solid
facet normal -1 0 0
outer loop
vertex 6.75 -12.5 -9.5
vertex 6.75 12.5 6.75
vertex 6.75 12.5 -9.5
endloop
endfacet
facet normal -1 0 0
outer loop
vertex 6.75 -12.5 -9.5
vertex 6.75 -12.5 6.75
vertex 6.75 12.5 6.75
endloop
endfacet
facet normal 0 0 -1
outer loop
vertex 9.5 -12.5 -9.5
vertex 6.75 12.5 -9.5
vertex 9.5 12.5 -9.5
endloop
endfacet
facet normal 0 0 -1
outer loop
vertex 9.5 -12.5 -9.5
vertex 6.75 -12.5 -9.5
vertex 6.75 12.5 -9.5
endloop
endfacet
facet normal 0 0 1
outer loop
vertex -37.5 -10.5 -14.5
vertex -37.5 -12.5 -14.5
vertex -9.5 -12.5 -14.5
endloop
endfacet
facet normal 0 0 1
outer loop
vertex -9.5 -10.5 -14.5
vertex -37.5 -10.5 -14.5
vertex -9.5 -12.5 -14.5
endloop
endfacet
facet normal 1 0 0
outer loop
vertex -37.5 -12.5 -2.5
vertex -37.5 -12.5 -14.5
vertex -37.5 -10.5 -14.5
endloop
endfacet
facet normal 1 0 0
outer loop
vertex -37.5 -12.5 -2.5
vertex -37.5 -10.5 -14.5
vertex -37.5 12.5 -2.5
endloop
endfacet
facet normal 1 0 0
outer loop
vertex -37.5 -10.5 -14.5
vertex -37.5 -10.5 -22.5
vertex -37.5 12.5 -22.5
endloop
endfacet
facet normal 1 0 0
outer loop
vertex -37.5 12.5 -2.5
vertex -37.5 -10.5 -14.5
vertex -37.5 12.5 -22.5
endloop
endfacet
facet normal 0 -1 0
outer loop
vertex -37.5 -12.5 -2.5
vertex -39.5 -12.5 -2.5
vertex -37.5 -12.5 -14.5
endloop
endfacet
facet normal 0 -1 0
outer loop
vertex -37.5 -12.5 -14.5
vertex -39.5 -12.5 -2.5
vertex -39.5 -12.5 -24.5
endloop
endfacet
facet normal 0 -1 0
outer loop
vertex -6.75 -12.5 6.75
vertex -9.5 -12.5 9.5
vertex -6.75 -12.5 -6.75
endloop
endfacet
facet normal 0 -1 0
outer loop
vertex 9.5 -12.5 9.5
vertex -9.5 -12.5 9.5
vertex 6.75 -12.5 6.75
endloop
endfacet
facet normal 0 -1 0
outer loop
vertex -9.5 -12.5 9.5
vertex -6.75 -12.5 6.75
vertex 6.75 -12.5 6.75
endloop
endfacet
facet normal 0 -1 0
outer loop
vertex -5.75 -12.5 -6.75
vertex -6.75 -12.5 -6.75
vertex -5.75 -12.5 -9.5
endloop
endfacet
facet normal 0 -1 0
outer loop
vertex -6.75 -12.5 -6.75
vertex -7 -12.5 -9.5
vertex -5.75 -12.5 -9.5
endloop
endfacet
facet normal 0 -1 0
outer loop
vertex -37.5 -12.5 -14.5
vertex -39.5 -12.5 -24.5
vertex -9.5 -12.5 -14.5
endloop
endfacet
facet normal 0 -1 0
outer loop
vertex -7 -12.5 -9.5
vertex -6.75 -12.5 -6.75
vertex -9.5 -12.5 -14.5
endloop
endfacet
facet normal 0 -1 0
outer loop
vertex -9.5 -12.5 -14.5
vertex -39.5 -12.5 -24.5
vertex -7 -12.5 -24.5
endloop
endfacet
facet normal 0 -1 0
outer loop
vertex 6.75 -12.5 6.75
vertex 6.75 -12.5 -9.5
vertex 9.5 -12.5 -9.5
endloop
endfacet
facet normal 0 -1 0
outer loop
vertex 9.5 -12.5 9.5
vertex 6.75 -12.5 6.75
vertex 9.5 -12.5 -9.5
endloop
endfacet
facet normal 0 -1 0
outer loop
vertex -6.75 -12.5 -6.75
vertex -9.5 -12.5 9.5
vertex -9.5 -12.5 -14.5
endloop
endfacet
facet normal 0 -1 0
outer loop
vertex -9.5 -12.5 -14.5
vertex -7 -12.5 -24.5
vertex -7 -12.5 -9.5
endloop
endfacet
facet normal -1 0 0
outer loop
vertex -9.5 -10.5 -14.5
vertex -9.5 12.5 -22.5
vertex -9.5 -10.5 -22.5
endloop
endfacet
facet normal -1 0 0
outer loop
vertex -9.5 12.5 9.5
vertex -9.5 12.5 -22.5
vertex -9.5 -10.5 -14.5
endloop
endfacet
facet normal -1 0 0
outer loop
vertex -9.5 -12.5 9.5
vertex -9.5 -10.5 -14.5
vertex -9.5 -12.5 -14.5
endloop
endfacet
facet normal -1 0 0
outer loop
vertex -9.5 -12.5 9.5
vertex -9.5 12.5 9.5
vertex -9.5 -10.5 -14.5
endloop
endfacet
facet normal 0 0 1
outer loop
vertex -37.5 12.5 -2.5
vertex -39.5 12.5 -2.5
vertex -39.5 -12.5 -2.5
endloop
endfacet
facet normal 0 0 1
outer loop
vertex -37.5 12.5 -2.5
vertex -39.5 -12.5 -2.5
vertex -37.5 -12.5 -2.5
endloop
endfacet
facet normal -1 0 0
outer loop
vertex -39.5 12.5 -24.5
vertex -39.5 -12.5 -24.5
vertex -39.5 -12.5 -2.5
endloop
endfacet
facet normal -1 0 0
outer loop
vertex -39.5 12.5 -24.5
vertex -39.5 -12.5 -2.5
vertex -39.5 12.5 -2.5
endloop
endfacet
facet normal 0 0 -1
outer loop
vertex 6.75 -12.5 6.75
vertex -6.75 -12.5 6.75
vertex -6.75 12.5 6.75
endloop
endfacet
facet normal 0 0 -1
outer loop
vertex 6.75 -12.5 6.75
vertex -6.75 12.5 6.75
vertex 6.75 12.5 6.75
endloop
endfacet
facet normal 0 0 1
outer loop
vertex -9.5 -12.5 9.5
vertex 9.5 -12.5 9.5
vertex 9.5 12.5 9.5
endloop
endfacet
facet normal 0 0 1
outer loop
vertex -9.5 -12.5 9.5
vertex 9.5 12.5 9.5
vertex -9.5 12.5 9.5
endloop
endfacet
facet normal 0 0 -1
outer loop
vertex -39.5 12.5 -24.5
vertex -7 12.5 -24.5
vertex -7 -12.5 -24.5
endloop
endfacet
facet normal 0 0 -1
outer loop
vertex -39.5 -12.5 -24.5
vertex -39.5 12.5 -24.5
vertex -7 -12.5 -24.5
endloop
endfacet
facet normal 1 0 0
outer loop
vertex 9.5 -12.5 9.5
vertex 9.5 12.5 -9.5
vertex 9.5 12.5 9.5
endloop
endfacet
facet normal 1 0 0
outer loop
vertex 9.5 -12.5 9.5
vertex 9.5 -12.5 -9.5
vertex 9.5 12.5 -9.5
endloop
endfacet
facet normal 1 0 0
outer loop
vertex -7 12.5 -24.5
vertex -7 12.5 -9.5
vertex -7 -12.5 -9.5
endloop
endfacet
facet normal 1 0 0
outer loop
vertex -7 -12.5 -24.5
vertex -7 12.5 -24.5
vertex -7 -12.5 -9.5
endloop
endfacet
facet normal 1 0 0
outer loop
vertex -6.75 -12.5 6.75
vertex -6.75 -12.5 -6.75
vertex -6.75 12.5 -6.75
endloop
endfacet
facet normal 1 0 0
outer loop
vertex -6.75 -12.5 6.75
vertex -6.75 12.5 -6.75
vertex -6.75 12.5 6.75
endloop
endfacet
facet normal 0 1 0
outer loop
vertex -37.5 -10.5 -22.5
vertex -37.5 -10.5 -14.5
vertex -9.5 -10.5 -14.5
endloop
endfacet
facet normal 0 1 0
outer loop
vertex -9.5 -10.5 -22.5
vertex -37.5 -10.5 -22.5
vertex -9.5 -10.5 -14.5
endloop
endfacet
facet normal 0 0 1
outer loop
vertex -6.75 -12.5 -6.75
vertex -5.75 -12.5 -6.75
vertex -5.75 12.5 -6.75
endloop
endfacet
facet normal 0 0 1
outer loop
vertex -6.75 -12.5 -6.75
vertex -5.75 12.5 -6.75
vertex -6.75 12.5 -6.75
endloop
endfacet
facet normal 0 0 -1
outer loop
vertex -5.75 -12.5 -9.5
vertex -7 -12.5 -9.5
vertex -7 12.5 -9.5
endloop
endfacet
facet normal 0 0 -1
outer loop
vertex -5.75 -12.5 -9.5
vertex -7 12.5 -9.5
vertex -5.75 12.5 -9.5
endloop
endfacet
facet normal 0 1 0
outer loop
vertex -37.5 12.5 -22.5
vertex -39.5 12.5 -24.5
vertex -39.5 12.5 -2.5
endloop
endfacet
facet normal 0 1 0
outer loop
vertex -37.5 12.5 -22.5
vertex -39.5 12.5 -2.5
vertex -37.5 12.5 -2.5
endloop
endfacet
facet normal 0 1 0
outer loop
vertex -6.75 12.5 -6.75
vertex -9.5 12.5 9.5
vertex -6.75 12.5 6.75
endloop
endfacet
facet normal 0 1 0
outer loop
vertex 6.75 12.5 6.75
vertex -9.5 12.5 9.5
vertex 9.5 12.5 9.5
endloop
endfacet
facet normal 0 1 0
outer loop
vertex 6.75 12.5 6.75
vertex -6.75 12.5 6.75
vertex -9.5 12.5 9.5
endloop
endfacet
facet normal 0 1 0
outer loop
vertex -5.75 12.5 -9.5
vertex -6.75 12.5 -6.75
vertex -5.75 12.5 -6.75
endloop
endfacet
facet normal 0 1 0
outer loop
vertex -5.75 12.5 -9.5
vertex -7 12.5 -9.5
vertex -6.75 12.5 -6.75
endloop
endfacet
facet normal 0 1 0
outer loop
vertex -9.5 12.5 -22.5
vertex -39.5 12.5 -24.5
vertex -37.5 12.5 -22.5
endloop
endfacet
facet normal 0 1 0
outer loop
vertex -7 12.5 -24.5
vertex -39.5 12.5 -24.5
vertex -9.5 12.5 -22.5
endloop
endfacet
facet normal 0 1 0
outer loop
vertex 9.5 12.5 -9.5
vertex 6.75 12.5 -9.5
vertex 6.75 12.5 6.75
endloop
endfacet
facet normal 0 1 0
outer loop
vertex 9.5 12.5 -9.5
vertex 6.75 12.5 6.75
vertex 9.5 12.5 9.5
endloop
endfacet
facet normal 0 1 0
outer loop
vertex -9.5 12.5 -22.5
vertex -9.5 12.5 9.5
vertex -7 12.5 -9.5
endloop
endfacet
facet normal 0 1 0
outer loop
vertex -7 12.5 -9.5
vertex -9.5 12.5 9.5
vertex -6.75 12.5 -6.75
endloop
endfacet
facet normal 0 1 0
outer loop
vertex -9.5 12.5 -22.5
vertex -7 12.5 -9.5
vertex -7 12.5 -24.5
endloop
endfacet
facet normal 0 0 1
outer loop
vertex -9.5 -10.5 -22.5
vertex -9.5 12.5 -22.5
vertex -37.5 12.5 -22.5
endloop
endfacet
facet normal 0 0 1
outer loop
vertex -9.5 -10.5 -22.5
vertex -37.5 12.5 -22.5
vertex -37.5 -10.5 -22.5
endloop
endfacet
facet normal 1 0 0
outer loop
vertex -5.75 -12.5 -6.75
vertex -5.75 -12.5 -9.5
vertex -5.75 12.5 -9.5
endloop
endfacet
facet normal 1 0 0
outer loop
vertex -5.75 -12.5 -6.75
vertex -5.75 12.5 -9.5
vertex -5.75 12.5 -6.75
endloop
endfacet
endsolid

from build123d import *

# Parameters (mm, degrees)
F1_DEPTH = 12.5
F2_W     = 25
F2_H     = 34
F3_DEPTH = 2.5
F4_W     = 25
F4_H     = 2
F5_DEPTH = 30
F6_W     = 2
F6_H     = 25
F7_DEPTH = 20
F8_W     = 32.5
F8_H     = 10
F9_DEPTH = 2


with BuildPart() as f1:
    # F0 (on Front) → F1 (new body, symmetric)
    with BuildSketch(Plane.XZ):
        Polygon((9.5, -9.5), (9.5, 9.5), (-9.5, 9.5), (-9.5, -9.5), (-5.75, -9.5), (-5.75, -6.75), (-6.75, -6.75), (-6.75, 6.75), (6.75, 6.75), (6.75, -6.75), (6.75, -9.5), align=None)
    extrude(amount=F1_DEPTH, both=True)

    # F2 (on face) → F3 (join)
    with BuildSketch(Plane(origin=(-9.5, 0, 0), x_dir=(0, -1, 0), z_dir=(-1, 0, 0))):
        with Locations((0, -7.5)):
            Rectangle(F2_W, F2_H)
    extrude(amount=-F3_DEPTH)

    # F4 (on face) → F5 (join)
    with BuildSketch(Plane(origin=(-9.5, 0, 0), x_dir=(0, -1, 0), z_dir=(-1, 0, 0))):
        with Locations((0, -23.5)):
            Rectangle(F4_W, F4_H)
    extrude(amount=F5_DEPTH)

    # F6 (on face) → F7 (join)
    with BuildSketch(Plane.XY.offset(-22.5)):
        with Locations((-38.5, 0)):
            Rectangle(F6_W, F6_H)
    extrude(amount=F7_DEPTH)

    # F8 (on face) → F9 (join)
    with BuildSketch(Plane.XZ.offset(12.5)):
        with Locations((-23.25, -19.5)):
            Rectangle(F8_W, F8_H)
    extrude(amount=-F9_DEPTH)


solid = f1.part
